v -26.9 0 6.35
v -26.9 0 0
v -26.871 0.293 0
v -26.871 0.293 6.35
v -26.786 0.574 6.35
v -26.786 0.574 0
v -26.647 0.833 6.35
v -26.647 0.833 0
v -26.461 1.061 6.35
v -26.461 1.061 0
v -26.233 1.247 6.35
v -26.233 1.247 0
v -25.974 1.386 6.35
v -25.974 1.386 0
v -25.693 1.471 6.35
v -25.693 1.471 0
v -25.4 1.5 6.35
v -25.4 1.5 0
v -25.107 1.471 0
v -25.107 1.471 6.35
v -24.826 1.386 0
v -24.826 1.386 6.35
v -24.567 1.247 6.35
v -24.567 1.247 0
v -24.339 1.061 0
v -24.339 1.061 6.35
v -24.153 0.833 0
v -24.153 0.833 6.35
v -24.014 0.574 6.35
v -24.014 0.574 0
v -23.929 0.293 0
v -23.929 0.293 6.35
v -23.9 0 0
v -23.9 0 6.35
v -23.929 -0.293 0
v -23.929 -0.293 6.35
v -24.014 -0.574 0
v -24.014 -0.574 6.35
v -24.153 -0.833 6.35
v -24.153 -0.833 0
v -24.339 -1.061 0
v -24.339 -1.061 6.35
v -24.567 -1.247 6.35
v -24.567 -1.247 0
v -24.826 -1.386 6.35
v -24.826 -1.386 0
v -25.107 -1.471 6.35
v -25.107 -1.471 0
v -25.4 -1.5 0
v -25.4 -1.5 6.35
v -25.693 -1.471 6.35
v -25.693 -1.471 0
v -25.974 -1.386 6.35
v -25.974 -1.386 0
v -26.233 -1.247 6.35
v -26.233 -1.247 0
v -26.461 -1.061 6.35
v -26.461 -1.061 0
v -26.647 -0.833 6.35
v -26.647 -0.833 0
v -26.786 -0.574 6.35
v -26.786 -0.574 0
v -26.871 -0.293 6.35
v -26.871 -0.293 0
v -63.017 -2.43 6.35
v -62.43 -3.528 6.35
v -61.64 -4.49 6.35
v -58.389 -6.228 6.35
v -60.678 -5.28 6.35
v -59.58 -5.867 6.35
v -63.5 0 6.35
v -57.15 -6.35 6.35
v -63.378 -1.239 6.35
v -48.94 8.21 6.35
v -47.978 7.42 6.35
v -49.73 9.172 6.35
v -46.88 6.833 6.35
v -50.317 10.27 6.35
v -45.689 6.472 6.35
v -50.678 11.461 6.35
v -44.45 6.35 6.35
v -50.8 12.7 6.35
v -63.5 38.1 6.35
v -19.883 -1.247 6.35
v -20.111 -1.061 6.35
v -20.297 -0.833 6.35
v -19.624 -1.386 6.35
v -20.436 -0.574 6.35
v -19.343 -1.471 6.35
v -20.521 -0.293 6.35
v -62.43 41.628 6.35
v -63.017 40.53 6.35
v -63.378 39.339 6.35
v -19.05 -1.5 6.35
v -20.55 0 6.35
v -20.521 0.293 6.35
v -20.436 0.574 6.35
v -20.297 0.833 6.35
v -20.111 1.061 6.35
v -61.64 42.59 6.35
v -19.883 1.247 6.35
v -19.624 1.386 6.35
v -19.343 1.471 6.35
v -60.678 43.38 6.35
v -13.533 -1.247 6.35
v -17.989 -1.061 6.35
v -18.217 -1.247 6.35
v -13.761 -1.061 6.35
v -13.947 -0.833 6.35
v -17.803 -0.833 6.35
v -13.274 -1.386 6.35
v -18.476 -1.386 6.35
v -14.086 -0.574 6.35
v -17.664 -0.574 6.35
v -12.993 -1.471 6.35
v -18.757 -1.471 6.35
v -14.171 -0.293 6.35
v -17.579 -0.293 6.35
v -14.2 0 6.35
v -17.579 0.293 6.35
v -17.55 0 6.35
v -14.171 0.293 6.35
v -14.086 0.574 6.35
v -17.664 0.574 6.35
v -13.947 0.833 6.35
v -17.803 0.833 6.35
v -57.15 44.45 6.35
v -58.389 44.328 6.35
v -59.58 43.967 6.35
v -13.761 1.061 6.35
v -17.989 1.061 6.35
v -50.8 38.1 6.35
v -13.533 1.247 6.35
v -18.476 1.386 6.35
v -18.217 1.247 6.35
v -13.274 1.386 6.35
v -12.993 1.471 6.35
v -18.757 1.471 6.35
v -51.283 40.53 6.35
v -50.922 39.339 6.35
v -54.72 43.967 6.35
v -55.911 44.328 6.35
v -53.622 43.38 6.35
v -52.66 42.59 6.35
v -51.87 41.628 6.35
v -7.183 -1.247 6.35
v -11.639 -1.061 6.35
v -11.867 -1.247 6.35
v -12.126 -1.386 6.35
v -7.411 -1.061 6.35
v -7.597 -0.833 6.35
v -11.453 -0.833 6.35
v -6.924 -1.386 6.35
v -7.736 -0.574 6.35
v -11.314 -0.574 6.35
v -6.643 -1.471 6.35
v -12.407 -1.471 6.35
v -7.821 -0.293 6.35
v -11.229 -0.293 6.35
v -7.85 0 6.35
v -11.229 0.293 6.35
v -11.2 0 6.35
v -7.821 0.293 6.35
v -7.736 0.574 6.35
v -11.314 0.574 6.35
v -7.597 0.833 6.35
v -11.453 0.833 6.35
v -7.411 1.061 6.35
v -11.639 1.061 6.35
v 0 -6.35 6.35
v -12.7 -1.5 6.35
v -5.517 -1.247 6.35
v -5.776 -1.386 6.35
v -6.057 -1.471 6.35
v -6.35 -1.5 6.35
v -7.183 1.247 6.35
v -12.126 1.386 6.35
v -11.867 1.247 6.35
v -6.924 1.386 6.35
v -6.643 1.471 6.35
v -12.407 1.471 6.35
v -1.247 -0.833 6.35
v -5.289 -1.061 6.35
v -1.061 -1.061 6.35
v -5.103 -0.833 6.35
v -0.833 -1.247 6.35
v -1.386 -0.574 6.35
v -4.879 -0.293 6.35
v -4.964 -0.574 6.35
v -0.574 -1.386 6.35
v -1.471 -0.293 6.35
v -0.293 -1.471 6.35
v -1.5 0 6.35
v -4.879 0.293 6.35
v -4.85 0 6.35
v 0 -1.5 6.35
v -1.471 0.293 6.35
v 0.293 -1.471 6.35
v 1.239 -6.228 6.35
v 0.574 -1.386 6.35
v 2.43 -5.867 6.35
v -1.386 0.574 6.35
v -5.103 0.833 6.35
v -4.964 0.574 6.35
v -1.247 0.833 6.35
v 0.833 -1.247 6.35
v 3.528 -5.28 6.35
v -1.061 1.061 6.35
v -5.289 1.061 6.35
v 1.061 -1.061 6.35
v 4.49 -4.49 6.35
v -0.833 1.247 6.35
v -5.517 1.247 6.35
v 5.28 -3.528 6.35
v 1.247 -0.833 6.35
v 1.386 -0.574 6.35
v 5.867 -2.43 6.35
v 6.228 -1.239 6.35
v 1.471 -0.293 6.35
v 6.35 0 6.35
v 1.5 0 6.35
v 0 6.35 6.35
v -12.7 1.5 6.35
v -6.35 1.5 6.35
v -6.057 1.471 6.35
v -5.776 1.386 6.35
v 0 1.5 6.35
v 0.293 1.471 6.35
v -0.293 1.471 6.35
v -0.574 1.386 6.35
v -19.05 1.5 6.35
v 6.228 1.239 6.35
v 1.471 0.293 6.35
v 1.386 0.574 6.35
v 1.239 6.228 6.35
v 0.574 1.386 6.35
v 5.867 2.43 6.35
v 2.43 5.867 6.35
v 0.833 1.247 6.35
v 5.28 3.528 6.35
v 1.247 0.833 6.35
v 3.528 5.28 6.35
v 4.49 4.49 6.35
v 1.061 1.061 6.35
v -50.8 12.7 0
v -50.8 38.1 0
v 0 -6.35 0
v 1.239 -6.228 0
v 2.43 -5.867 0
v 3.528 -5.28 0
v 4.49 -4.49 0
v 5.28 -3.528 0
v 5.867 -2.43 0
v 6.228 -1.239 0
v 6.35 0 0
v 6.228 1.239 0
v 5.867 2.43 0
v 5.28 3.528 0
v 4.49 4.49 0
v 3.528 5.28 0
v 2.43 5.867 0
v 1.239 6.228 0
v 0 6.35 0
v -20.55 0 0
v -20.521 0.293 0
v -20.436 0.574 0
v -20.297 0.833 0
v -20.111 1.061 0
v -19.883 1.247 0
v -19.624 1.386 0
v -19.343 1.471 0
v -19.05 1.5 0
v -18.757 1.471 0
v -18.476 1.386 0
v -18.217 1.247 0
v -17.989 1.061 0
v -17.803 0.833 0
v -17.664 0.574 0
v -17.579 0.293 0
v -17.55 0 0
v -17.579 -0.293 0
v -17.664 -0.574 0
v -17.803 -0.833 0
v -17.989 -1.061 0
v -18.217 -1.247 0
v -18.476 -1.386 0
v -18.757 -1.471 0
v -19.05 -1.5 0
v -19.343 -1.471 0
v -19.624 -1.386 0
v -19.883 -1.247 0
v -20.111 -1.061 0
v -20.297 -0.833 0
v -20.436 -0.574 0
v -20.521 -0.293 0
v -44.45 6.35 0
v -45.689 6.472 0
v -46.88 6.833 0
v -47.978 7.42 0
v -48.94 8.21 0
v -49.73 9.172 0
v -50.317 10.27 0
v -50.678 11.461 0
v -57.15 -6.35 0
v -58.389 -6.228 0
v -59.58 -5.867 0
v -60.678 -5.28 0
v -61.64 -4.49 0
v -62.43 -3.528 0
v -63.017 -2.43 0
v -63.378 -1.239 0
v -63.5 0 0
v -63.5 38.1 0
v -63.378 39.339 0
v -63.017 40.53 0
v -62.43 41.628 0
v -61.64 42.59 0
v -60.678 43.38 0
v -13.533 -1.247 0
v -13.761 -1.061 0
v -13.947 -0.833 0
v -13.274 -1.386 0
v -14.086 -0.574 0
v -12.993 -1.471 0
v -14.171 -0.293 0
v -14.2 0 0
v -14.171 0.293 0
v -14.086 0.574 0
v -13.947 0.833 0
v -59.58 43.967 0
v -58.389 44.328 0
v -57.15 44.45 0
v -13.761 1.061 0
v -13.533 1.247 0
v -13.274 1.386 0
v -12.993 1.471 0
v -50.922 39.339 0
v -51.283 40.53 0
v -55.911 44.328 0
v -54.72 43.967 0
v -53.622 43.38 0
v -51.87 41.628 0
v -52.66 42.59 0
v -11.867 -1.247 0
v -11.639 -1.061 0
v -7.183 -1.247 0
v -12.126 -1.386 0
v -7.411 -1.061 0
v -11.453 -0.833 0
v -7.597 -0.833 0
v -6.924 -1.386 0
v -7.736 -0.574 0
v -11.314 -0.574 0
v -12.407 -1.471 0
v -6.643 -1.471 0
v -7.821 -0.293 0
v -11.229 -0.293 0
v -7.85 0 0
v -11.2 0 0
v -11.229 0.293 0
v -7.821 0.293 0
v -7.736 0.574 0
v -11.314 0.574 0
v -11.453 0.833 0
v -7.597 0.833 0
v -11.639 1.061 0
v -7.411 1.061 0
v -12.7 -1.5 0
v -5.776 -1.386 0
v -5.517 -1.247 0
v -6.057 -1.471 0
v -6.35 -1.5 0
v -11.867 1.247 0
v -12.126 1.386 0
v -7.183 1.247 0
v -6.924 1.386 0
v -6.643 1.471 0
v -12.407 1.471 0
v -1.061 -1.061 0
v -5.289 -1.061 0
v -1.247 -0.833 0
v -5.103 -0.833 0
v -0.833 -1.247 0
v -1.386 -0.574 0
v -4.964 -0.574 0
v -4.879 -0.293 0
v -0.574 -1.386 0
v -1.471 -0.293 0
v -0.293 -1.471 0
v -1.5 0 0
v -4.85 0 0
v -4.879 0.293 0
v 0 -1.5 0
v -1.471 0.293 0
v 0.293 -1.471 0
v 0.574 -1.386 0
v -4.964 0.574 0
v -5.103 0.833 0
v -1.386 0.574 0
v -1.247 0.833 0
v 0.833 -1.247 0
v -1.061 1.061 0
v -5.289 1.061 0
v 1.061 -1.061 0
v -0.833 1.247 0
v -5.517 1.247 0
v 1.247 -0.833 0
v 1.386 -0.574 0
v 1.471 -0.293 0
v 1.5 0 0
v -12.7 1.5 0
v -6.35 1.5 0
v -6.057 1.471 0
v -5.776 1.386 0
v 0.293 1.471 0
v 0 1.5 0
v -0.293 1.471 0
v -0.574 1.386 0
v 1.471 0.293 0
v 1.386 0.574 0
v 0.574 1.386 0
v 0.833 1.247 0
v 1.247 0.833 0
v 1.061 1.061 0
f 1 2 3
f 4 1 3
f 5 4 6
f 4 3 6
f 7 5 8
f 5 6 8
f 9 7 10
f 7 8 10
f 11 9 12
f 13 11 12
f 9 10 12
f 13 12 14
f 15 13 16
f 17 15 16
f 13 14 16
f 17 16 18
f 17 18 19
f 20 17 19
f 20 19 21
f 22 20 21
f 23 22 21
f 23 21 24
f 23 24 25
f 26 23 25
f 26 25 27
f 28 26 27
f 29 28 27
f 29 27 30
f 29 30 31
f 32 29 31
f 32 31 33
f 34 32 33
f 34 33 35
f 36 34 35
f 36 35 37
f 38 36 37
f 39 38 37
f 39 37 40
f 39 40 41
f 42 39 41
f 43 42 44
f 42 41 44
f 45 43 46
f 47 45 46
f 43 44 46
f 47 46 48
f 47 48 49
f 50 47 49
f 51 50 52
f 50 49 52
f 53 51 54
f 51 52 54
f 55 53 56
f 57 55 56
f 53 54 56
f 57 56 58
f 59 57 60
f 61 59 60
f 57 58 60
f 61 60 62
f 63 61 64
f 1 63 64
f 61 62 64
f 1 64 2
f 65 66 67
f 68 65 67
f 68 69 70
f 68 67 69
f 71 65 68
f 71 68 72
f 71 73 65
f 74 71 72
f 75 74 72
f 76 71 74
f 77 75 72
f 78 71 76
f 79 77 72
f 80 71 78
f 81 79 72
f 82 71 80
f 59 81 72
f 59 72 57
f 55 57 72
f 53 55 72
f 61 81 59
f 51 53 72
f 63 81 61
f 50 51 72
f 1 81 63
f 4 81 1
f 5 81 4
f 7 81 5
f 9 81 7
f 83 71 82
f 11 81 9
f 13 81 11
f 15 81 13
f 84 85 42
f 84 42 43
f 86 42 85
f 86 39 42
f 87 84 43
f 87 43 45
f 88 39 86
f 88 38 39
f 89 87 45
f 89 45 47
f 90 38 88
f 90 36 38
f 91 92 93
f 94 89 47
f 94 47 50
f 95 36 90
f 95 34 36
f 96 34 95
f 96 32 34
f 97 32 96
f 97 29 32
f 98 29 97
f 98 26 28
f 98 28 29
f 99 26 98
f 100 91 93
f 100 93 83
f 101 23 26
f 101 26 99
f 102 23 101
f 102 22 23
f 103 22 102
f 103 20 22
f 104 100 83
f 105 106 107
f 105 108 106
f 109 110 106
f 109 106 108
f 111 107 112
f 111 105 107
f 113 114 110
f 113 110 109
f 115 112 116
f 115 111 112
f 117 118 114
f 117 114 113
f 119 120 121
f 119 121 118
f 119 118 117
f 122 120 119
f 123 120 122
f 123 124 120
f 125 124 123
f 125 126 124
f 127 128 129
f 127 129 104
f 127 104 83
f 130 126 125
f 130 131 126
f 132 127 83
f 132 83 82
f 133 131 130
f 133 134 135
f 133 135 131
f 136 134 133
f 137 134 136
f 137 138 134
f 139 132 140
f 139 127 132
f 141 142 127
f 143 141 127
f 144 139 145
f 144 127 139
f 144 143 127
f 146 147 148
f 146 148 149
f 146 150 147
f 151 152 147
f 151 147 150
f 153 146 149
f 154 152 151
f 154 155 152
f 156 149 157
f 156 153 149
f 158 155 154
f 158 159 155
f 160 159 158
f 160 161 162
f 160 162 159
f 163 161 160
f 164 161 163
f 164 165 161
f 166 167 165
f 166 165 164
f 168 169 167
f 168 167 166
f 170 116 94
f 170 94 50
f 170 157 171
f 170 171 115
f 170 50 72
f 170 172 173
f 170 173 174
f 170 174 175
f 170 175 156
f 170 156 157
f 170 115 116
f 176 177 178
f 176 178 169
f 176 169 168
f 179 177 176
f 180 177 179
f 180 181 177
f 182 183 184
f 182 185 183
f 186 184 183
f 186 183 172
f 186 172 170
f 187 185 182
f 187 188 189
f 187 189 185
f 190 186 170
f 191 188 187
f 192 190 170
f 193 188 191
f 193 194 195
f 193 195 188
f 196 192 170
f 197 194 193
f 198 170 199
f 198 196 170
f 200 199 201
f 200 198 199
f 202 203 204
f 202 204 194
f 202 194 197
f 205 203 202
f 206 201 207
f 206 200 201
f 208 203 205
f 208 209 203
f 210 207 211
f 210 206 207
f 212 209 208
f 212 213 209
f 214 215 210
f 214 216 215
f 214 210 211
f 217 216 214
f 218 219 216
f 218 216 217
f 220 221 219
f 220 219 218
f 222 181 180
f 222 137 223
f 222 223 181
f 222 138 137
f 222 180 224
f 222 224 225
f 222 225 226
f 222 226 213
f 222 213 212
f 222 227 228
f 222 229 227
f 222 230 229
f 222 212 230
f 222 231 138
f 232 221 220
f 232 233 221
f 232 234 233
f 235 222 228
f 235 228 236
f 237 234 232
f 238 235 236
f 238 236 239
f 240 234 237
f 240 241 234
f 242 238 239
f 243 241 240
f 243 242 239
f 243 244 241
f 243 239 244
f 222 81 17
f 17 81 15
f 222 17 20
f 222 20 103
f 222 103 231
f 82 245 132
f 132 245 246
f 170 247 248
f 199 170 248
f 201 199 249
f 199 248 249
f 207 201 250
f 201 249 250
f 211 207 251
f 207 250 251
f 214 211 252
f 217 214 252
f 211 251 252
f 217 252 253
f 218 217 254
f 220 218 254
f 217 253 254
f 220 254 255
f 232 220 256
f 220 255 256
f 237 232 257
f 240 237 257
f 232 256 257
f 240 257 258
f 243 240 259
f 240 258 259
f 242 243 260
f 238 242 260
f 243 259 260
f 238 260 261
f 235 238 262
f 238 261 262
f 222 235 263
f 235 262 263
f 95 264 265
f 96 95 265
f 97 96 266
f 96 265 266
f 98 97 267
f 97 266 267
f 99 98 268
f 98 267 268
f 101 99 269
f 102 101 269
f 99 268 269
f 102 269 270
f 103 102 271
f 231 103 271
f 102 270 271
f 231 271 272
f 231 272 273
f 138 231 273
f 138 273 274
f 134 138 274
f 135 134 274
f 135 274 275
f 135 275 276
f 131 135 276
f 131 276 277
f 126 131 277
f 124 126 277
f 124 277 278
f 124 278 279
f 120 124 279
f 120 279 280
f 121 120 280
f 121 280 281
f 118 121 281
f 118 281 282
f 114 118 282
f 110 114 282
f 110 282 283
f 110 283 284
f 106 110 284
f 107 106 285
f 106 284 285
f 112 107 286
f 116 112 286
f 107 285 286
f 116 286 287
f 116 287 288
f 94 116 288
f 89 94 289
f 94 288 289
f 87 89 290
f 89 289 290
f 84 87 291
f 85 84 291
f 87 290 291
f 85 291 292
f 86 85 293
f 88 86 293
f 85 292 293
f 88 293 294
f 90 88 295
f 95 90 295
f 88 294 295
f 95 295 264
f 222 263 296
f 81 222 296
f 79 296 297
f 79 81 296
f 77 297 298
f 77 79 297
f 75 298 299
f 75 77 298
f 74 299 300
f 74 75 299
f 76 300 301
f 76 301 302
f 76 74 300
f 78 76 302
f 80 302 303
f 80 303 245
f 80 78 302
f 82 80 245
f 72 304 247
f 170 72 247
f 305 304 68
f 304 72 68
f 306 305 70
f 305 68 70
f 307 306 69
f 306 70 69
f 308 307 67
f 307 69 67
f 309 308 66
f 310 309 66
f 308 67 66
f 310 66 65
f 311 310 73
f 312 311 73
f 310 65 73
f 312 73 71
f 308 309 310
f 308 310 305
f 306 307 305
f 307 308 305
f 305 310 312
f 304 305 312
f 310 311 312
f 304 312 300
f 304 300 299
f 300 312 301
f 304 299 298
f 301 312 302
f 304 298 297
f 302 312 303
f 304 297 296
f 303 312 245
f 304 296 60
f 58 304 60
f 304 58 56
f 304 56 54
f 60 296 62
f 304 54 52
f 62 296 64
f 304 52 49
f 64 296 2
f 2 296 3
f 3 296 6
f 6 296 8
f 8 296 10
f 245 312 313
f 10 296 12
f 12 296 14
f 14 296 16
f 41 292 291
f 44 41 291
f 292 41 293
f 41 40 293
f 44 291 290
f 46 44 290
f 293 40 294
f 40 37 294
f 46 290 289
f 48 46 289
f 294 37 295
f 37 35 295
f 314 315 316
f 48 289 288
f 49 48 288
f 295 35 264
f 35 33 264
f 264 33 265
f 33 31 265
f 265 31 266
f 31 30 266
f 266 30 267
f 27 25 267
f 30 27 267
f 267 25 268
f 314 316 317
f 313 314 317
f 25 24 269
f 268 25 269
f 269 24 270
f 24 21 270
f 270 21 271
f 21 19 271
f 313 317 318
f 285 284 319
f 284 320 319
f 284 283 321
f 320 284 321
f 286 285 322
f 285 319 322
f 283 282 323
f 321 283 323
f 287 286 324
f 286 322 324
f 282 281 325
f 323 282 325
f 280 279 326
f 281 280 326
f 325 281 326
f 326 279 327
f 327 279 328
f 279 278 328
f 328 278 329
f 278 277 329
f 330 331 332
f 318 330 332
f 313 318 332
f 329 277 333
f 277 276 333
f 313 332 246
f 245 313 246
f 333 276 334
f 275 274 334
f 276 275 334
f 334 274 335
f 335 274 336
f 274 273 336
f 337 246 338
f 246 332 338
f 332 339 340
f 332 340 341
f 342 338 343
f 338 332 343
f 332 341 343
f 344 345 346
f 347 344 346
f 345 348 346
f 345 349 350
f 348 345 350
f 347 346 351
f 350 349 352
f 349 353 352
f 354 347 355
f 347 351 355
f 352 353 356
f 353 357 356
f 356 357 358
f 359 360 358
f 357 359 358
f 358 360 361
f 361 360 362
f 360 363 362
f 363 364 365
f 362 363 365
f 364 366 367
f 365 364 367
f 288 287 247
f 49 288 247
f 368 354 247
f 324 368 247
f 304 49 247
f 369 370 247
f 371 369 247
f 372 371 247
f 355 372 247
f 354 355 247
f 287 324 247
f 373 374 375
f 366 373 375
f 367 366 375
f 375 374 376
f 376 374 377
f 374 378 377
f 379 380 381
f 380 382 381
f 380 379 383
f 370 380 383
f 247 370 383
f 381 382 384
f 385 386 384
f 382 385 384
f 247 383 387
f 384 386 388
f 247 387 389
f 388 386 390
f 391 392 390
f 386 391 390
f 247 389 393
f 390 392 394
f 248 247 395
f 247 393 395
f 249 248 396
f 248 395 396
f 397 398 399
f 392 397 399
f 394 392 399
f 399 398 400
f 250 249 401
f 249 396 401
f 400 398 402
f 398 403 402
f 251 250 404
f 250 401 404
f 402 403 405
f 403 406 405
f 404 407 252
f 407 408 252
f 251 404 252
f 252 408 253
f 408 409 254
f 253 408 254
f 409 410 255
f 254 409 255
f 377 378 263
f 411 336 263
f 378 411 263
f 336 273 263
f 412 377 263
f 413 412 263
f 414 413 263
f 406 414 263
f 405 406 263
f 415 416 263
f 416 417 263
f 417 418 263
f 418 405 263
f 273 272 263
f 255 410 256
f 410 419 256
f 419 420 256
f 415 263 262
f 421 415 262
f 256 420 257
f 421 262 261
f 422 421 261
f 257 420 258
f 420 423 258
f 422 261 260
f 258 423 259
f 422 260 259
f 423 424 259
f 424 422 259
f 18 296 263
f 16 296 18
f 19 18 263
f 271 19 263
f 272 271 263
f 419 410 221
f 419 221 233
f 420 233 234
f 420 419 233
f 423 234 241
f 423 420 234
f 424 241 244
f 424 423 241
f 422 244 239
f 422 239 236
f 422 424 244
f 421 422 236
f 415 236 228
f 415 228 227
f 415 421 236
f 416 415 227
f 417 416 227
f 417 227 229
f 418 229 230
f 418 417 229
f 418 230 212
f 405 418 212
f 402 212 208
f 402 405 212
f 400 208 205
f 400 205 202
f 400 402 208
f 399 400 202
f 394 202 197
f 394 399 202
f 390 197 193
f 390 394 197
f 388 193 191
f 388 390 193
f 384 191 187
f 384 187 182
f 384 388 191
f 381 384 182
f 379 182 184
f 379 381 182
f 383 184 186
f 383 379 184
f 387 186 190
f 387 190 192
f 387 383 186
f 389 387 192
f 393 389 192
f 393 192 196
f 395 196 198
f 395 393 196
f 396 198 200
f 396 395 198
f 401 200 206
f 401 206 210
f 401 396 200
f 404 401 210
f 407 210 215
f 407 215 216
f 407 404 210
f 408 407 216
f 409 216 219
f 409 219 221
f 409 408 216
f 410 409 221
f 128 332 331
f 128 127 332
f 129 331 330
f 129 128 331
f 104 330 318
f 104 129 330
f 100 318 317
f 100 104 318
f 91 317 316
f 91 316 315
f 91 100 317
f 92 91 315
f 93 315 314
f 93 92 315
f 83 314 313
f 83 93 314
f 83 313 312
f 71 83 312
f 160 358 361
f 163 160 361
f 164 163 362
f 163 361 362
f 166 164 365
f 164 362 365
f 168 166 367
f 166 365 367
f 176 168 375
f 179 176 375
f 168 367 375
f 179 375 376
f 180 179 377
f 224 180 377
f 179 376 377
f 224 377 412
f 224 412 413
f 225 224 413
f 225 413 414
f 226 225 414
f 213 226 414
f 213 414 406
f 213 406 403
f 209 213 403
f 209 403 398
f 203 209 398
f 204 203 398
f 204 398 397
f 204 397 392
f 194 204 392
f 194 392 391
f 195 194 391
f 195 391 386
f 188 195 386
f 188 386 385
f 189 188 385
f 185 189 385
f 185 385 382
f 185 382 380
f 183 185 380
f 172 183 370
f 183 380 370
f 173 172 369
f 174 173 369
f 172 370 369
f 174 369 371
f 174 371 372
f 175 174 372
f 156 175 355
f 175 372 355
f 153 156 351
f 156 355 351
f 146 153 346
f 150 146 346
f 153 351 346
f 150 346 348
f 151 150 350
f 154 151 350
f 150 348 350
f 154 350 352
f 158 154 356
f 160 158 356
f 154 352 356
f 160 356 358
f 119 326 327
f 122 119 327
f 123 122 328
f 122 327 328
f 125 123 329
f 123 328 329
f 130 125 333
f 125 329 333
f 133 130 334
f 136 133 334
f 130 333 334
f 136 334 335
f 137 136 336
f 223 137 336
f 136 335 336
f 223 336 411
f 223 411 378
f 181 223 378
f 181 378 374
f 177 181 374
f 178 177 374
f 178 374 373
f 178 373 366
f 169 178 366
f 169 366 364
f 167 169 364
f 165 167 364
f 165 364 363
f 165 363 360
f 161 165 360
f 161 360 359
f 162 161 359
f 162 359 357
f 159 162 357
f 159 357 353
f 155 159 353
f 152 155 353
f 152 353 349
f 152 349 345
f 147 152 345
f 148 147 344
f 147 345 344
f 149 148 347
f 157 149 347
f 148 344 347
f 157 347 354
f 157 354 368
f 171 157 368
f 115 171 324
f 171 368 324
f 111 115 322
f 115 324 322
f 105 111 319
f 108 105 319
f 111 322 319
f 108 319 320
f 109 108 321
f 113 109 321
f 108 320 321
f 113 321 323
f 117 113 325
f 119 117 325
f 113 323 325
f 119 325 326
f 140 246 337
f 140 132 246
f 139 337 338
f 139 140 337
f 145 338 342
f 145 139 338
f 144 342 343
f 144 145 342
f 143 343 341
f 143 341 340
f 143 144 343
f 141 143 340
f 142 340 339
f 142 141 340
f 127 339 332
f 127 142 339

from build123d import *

# Parameters (mm, degrees)
SKETCH1_R           = 1.5
BOSS_EXTRUDE1_DEPTH = 6.35
FILLET1_R           = 6.35
SKETCH2_R           = 1.5
CUT_EXTRUDE1_DEPTH  = 78.771299333


with BuildPart() as part:
    # Sketch1 → Boss-Extrude1 (new body)
    with BuildSketch(Plane.XY):
        with BuildLine():
            Line((0, 6.35), (-50.8, 6.35))
            Line((-50.8, 6.35), (-50.8, 44.45))
            Line((-50.8, 44.45), (-63.5, 44.45))
            Line((-63.5, 44.45), (-63.5, -6.35))
            Line((-63.5, -6.35), (0, -6.35))
            ThreePointArc((0, -6.35), (6.35, 0), (0, 6.35))
        make_face()
        Circle(SKETCH1_R, mode=Mode.SUBTRACT)
    extrude(amount=BOSS_EXTRUDE1_DEPTH)

    # Fillet1
    fillet1_edges = [part.edges().sort_by_distance(p)[0] for p in [
        (-63.5, -6.35, 3.175),
        (-50.8, 6.35, 3.175),
        (-63.5, 44.45, 3.175),
        (-50.8, 44.45, 3.175),
    ]]
    fillet(fillet1_edges, radius=FILLET1_R - 0.0001)  # a hair under: the kernel refuses the full size

    # Sketch2 → Cut-Extrude1 (cut, through all)
    with BuildSketch(Plane(origin=(0, 0, 0), x_dir=(-1, 0, 0), z_dir=(0, 0, -1))):
        with Locations((6.35, 0)):
            Circle(SKETCH2_R)
        with Locations((12.7, 0)):
            Circle(SKETCH2_R)
        with Locations((25.4, 0)):
            Circle(SKETCH2_R)
        with Locations((19.05, 0)):
            Circle(SKETCH2_R)
    extrude(amount=-CUT_EXTRUDE1_DEPTH, mode=Mode.SUBTRACT)


solid = part.part
